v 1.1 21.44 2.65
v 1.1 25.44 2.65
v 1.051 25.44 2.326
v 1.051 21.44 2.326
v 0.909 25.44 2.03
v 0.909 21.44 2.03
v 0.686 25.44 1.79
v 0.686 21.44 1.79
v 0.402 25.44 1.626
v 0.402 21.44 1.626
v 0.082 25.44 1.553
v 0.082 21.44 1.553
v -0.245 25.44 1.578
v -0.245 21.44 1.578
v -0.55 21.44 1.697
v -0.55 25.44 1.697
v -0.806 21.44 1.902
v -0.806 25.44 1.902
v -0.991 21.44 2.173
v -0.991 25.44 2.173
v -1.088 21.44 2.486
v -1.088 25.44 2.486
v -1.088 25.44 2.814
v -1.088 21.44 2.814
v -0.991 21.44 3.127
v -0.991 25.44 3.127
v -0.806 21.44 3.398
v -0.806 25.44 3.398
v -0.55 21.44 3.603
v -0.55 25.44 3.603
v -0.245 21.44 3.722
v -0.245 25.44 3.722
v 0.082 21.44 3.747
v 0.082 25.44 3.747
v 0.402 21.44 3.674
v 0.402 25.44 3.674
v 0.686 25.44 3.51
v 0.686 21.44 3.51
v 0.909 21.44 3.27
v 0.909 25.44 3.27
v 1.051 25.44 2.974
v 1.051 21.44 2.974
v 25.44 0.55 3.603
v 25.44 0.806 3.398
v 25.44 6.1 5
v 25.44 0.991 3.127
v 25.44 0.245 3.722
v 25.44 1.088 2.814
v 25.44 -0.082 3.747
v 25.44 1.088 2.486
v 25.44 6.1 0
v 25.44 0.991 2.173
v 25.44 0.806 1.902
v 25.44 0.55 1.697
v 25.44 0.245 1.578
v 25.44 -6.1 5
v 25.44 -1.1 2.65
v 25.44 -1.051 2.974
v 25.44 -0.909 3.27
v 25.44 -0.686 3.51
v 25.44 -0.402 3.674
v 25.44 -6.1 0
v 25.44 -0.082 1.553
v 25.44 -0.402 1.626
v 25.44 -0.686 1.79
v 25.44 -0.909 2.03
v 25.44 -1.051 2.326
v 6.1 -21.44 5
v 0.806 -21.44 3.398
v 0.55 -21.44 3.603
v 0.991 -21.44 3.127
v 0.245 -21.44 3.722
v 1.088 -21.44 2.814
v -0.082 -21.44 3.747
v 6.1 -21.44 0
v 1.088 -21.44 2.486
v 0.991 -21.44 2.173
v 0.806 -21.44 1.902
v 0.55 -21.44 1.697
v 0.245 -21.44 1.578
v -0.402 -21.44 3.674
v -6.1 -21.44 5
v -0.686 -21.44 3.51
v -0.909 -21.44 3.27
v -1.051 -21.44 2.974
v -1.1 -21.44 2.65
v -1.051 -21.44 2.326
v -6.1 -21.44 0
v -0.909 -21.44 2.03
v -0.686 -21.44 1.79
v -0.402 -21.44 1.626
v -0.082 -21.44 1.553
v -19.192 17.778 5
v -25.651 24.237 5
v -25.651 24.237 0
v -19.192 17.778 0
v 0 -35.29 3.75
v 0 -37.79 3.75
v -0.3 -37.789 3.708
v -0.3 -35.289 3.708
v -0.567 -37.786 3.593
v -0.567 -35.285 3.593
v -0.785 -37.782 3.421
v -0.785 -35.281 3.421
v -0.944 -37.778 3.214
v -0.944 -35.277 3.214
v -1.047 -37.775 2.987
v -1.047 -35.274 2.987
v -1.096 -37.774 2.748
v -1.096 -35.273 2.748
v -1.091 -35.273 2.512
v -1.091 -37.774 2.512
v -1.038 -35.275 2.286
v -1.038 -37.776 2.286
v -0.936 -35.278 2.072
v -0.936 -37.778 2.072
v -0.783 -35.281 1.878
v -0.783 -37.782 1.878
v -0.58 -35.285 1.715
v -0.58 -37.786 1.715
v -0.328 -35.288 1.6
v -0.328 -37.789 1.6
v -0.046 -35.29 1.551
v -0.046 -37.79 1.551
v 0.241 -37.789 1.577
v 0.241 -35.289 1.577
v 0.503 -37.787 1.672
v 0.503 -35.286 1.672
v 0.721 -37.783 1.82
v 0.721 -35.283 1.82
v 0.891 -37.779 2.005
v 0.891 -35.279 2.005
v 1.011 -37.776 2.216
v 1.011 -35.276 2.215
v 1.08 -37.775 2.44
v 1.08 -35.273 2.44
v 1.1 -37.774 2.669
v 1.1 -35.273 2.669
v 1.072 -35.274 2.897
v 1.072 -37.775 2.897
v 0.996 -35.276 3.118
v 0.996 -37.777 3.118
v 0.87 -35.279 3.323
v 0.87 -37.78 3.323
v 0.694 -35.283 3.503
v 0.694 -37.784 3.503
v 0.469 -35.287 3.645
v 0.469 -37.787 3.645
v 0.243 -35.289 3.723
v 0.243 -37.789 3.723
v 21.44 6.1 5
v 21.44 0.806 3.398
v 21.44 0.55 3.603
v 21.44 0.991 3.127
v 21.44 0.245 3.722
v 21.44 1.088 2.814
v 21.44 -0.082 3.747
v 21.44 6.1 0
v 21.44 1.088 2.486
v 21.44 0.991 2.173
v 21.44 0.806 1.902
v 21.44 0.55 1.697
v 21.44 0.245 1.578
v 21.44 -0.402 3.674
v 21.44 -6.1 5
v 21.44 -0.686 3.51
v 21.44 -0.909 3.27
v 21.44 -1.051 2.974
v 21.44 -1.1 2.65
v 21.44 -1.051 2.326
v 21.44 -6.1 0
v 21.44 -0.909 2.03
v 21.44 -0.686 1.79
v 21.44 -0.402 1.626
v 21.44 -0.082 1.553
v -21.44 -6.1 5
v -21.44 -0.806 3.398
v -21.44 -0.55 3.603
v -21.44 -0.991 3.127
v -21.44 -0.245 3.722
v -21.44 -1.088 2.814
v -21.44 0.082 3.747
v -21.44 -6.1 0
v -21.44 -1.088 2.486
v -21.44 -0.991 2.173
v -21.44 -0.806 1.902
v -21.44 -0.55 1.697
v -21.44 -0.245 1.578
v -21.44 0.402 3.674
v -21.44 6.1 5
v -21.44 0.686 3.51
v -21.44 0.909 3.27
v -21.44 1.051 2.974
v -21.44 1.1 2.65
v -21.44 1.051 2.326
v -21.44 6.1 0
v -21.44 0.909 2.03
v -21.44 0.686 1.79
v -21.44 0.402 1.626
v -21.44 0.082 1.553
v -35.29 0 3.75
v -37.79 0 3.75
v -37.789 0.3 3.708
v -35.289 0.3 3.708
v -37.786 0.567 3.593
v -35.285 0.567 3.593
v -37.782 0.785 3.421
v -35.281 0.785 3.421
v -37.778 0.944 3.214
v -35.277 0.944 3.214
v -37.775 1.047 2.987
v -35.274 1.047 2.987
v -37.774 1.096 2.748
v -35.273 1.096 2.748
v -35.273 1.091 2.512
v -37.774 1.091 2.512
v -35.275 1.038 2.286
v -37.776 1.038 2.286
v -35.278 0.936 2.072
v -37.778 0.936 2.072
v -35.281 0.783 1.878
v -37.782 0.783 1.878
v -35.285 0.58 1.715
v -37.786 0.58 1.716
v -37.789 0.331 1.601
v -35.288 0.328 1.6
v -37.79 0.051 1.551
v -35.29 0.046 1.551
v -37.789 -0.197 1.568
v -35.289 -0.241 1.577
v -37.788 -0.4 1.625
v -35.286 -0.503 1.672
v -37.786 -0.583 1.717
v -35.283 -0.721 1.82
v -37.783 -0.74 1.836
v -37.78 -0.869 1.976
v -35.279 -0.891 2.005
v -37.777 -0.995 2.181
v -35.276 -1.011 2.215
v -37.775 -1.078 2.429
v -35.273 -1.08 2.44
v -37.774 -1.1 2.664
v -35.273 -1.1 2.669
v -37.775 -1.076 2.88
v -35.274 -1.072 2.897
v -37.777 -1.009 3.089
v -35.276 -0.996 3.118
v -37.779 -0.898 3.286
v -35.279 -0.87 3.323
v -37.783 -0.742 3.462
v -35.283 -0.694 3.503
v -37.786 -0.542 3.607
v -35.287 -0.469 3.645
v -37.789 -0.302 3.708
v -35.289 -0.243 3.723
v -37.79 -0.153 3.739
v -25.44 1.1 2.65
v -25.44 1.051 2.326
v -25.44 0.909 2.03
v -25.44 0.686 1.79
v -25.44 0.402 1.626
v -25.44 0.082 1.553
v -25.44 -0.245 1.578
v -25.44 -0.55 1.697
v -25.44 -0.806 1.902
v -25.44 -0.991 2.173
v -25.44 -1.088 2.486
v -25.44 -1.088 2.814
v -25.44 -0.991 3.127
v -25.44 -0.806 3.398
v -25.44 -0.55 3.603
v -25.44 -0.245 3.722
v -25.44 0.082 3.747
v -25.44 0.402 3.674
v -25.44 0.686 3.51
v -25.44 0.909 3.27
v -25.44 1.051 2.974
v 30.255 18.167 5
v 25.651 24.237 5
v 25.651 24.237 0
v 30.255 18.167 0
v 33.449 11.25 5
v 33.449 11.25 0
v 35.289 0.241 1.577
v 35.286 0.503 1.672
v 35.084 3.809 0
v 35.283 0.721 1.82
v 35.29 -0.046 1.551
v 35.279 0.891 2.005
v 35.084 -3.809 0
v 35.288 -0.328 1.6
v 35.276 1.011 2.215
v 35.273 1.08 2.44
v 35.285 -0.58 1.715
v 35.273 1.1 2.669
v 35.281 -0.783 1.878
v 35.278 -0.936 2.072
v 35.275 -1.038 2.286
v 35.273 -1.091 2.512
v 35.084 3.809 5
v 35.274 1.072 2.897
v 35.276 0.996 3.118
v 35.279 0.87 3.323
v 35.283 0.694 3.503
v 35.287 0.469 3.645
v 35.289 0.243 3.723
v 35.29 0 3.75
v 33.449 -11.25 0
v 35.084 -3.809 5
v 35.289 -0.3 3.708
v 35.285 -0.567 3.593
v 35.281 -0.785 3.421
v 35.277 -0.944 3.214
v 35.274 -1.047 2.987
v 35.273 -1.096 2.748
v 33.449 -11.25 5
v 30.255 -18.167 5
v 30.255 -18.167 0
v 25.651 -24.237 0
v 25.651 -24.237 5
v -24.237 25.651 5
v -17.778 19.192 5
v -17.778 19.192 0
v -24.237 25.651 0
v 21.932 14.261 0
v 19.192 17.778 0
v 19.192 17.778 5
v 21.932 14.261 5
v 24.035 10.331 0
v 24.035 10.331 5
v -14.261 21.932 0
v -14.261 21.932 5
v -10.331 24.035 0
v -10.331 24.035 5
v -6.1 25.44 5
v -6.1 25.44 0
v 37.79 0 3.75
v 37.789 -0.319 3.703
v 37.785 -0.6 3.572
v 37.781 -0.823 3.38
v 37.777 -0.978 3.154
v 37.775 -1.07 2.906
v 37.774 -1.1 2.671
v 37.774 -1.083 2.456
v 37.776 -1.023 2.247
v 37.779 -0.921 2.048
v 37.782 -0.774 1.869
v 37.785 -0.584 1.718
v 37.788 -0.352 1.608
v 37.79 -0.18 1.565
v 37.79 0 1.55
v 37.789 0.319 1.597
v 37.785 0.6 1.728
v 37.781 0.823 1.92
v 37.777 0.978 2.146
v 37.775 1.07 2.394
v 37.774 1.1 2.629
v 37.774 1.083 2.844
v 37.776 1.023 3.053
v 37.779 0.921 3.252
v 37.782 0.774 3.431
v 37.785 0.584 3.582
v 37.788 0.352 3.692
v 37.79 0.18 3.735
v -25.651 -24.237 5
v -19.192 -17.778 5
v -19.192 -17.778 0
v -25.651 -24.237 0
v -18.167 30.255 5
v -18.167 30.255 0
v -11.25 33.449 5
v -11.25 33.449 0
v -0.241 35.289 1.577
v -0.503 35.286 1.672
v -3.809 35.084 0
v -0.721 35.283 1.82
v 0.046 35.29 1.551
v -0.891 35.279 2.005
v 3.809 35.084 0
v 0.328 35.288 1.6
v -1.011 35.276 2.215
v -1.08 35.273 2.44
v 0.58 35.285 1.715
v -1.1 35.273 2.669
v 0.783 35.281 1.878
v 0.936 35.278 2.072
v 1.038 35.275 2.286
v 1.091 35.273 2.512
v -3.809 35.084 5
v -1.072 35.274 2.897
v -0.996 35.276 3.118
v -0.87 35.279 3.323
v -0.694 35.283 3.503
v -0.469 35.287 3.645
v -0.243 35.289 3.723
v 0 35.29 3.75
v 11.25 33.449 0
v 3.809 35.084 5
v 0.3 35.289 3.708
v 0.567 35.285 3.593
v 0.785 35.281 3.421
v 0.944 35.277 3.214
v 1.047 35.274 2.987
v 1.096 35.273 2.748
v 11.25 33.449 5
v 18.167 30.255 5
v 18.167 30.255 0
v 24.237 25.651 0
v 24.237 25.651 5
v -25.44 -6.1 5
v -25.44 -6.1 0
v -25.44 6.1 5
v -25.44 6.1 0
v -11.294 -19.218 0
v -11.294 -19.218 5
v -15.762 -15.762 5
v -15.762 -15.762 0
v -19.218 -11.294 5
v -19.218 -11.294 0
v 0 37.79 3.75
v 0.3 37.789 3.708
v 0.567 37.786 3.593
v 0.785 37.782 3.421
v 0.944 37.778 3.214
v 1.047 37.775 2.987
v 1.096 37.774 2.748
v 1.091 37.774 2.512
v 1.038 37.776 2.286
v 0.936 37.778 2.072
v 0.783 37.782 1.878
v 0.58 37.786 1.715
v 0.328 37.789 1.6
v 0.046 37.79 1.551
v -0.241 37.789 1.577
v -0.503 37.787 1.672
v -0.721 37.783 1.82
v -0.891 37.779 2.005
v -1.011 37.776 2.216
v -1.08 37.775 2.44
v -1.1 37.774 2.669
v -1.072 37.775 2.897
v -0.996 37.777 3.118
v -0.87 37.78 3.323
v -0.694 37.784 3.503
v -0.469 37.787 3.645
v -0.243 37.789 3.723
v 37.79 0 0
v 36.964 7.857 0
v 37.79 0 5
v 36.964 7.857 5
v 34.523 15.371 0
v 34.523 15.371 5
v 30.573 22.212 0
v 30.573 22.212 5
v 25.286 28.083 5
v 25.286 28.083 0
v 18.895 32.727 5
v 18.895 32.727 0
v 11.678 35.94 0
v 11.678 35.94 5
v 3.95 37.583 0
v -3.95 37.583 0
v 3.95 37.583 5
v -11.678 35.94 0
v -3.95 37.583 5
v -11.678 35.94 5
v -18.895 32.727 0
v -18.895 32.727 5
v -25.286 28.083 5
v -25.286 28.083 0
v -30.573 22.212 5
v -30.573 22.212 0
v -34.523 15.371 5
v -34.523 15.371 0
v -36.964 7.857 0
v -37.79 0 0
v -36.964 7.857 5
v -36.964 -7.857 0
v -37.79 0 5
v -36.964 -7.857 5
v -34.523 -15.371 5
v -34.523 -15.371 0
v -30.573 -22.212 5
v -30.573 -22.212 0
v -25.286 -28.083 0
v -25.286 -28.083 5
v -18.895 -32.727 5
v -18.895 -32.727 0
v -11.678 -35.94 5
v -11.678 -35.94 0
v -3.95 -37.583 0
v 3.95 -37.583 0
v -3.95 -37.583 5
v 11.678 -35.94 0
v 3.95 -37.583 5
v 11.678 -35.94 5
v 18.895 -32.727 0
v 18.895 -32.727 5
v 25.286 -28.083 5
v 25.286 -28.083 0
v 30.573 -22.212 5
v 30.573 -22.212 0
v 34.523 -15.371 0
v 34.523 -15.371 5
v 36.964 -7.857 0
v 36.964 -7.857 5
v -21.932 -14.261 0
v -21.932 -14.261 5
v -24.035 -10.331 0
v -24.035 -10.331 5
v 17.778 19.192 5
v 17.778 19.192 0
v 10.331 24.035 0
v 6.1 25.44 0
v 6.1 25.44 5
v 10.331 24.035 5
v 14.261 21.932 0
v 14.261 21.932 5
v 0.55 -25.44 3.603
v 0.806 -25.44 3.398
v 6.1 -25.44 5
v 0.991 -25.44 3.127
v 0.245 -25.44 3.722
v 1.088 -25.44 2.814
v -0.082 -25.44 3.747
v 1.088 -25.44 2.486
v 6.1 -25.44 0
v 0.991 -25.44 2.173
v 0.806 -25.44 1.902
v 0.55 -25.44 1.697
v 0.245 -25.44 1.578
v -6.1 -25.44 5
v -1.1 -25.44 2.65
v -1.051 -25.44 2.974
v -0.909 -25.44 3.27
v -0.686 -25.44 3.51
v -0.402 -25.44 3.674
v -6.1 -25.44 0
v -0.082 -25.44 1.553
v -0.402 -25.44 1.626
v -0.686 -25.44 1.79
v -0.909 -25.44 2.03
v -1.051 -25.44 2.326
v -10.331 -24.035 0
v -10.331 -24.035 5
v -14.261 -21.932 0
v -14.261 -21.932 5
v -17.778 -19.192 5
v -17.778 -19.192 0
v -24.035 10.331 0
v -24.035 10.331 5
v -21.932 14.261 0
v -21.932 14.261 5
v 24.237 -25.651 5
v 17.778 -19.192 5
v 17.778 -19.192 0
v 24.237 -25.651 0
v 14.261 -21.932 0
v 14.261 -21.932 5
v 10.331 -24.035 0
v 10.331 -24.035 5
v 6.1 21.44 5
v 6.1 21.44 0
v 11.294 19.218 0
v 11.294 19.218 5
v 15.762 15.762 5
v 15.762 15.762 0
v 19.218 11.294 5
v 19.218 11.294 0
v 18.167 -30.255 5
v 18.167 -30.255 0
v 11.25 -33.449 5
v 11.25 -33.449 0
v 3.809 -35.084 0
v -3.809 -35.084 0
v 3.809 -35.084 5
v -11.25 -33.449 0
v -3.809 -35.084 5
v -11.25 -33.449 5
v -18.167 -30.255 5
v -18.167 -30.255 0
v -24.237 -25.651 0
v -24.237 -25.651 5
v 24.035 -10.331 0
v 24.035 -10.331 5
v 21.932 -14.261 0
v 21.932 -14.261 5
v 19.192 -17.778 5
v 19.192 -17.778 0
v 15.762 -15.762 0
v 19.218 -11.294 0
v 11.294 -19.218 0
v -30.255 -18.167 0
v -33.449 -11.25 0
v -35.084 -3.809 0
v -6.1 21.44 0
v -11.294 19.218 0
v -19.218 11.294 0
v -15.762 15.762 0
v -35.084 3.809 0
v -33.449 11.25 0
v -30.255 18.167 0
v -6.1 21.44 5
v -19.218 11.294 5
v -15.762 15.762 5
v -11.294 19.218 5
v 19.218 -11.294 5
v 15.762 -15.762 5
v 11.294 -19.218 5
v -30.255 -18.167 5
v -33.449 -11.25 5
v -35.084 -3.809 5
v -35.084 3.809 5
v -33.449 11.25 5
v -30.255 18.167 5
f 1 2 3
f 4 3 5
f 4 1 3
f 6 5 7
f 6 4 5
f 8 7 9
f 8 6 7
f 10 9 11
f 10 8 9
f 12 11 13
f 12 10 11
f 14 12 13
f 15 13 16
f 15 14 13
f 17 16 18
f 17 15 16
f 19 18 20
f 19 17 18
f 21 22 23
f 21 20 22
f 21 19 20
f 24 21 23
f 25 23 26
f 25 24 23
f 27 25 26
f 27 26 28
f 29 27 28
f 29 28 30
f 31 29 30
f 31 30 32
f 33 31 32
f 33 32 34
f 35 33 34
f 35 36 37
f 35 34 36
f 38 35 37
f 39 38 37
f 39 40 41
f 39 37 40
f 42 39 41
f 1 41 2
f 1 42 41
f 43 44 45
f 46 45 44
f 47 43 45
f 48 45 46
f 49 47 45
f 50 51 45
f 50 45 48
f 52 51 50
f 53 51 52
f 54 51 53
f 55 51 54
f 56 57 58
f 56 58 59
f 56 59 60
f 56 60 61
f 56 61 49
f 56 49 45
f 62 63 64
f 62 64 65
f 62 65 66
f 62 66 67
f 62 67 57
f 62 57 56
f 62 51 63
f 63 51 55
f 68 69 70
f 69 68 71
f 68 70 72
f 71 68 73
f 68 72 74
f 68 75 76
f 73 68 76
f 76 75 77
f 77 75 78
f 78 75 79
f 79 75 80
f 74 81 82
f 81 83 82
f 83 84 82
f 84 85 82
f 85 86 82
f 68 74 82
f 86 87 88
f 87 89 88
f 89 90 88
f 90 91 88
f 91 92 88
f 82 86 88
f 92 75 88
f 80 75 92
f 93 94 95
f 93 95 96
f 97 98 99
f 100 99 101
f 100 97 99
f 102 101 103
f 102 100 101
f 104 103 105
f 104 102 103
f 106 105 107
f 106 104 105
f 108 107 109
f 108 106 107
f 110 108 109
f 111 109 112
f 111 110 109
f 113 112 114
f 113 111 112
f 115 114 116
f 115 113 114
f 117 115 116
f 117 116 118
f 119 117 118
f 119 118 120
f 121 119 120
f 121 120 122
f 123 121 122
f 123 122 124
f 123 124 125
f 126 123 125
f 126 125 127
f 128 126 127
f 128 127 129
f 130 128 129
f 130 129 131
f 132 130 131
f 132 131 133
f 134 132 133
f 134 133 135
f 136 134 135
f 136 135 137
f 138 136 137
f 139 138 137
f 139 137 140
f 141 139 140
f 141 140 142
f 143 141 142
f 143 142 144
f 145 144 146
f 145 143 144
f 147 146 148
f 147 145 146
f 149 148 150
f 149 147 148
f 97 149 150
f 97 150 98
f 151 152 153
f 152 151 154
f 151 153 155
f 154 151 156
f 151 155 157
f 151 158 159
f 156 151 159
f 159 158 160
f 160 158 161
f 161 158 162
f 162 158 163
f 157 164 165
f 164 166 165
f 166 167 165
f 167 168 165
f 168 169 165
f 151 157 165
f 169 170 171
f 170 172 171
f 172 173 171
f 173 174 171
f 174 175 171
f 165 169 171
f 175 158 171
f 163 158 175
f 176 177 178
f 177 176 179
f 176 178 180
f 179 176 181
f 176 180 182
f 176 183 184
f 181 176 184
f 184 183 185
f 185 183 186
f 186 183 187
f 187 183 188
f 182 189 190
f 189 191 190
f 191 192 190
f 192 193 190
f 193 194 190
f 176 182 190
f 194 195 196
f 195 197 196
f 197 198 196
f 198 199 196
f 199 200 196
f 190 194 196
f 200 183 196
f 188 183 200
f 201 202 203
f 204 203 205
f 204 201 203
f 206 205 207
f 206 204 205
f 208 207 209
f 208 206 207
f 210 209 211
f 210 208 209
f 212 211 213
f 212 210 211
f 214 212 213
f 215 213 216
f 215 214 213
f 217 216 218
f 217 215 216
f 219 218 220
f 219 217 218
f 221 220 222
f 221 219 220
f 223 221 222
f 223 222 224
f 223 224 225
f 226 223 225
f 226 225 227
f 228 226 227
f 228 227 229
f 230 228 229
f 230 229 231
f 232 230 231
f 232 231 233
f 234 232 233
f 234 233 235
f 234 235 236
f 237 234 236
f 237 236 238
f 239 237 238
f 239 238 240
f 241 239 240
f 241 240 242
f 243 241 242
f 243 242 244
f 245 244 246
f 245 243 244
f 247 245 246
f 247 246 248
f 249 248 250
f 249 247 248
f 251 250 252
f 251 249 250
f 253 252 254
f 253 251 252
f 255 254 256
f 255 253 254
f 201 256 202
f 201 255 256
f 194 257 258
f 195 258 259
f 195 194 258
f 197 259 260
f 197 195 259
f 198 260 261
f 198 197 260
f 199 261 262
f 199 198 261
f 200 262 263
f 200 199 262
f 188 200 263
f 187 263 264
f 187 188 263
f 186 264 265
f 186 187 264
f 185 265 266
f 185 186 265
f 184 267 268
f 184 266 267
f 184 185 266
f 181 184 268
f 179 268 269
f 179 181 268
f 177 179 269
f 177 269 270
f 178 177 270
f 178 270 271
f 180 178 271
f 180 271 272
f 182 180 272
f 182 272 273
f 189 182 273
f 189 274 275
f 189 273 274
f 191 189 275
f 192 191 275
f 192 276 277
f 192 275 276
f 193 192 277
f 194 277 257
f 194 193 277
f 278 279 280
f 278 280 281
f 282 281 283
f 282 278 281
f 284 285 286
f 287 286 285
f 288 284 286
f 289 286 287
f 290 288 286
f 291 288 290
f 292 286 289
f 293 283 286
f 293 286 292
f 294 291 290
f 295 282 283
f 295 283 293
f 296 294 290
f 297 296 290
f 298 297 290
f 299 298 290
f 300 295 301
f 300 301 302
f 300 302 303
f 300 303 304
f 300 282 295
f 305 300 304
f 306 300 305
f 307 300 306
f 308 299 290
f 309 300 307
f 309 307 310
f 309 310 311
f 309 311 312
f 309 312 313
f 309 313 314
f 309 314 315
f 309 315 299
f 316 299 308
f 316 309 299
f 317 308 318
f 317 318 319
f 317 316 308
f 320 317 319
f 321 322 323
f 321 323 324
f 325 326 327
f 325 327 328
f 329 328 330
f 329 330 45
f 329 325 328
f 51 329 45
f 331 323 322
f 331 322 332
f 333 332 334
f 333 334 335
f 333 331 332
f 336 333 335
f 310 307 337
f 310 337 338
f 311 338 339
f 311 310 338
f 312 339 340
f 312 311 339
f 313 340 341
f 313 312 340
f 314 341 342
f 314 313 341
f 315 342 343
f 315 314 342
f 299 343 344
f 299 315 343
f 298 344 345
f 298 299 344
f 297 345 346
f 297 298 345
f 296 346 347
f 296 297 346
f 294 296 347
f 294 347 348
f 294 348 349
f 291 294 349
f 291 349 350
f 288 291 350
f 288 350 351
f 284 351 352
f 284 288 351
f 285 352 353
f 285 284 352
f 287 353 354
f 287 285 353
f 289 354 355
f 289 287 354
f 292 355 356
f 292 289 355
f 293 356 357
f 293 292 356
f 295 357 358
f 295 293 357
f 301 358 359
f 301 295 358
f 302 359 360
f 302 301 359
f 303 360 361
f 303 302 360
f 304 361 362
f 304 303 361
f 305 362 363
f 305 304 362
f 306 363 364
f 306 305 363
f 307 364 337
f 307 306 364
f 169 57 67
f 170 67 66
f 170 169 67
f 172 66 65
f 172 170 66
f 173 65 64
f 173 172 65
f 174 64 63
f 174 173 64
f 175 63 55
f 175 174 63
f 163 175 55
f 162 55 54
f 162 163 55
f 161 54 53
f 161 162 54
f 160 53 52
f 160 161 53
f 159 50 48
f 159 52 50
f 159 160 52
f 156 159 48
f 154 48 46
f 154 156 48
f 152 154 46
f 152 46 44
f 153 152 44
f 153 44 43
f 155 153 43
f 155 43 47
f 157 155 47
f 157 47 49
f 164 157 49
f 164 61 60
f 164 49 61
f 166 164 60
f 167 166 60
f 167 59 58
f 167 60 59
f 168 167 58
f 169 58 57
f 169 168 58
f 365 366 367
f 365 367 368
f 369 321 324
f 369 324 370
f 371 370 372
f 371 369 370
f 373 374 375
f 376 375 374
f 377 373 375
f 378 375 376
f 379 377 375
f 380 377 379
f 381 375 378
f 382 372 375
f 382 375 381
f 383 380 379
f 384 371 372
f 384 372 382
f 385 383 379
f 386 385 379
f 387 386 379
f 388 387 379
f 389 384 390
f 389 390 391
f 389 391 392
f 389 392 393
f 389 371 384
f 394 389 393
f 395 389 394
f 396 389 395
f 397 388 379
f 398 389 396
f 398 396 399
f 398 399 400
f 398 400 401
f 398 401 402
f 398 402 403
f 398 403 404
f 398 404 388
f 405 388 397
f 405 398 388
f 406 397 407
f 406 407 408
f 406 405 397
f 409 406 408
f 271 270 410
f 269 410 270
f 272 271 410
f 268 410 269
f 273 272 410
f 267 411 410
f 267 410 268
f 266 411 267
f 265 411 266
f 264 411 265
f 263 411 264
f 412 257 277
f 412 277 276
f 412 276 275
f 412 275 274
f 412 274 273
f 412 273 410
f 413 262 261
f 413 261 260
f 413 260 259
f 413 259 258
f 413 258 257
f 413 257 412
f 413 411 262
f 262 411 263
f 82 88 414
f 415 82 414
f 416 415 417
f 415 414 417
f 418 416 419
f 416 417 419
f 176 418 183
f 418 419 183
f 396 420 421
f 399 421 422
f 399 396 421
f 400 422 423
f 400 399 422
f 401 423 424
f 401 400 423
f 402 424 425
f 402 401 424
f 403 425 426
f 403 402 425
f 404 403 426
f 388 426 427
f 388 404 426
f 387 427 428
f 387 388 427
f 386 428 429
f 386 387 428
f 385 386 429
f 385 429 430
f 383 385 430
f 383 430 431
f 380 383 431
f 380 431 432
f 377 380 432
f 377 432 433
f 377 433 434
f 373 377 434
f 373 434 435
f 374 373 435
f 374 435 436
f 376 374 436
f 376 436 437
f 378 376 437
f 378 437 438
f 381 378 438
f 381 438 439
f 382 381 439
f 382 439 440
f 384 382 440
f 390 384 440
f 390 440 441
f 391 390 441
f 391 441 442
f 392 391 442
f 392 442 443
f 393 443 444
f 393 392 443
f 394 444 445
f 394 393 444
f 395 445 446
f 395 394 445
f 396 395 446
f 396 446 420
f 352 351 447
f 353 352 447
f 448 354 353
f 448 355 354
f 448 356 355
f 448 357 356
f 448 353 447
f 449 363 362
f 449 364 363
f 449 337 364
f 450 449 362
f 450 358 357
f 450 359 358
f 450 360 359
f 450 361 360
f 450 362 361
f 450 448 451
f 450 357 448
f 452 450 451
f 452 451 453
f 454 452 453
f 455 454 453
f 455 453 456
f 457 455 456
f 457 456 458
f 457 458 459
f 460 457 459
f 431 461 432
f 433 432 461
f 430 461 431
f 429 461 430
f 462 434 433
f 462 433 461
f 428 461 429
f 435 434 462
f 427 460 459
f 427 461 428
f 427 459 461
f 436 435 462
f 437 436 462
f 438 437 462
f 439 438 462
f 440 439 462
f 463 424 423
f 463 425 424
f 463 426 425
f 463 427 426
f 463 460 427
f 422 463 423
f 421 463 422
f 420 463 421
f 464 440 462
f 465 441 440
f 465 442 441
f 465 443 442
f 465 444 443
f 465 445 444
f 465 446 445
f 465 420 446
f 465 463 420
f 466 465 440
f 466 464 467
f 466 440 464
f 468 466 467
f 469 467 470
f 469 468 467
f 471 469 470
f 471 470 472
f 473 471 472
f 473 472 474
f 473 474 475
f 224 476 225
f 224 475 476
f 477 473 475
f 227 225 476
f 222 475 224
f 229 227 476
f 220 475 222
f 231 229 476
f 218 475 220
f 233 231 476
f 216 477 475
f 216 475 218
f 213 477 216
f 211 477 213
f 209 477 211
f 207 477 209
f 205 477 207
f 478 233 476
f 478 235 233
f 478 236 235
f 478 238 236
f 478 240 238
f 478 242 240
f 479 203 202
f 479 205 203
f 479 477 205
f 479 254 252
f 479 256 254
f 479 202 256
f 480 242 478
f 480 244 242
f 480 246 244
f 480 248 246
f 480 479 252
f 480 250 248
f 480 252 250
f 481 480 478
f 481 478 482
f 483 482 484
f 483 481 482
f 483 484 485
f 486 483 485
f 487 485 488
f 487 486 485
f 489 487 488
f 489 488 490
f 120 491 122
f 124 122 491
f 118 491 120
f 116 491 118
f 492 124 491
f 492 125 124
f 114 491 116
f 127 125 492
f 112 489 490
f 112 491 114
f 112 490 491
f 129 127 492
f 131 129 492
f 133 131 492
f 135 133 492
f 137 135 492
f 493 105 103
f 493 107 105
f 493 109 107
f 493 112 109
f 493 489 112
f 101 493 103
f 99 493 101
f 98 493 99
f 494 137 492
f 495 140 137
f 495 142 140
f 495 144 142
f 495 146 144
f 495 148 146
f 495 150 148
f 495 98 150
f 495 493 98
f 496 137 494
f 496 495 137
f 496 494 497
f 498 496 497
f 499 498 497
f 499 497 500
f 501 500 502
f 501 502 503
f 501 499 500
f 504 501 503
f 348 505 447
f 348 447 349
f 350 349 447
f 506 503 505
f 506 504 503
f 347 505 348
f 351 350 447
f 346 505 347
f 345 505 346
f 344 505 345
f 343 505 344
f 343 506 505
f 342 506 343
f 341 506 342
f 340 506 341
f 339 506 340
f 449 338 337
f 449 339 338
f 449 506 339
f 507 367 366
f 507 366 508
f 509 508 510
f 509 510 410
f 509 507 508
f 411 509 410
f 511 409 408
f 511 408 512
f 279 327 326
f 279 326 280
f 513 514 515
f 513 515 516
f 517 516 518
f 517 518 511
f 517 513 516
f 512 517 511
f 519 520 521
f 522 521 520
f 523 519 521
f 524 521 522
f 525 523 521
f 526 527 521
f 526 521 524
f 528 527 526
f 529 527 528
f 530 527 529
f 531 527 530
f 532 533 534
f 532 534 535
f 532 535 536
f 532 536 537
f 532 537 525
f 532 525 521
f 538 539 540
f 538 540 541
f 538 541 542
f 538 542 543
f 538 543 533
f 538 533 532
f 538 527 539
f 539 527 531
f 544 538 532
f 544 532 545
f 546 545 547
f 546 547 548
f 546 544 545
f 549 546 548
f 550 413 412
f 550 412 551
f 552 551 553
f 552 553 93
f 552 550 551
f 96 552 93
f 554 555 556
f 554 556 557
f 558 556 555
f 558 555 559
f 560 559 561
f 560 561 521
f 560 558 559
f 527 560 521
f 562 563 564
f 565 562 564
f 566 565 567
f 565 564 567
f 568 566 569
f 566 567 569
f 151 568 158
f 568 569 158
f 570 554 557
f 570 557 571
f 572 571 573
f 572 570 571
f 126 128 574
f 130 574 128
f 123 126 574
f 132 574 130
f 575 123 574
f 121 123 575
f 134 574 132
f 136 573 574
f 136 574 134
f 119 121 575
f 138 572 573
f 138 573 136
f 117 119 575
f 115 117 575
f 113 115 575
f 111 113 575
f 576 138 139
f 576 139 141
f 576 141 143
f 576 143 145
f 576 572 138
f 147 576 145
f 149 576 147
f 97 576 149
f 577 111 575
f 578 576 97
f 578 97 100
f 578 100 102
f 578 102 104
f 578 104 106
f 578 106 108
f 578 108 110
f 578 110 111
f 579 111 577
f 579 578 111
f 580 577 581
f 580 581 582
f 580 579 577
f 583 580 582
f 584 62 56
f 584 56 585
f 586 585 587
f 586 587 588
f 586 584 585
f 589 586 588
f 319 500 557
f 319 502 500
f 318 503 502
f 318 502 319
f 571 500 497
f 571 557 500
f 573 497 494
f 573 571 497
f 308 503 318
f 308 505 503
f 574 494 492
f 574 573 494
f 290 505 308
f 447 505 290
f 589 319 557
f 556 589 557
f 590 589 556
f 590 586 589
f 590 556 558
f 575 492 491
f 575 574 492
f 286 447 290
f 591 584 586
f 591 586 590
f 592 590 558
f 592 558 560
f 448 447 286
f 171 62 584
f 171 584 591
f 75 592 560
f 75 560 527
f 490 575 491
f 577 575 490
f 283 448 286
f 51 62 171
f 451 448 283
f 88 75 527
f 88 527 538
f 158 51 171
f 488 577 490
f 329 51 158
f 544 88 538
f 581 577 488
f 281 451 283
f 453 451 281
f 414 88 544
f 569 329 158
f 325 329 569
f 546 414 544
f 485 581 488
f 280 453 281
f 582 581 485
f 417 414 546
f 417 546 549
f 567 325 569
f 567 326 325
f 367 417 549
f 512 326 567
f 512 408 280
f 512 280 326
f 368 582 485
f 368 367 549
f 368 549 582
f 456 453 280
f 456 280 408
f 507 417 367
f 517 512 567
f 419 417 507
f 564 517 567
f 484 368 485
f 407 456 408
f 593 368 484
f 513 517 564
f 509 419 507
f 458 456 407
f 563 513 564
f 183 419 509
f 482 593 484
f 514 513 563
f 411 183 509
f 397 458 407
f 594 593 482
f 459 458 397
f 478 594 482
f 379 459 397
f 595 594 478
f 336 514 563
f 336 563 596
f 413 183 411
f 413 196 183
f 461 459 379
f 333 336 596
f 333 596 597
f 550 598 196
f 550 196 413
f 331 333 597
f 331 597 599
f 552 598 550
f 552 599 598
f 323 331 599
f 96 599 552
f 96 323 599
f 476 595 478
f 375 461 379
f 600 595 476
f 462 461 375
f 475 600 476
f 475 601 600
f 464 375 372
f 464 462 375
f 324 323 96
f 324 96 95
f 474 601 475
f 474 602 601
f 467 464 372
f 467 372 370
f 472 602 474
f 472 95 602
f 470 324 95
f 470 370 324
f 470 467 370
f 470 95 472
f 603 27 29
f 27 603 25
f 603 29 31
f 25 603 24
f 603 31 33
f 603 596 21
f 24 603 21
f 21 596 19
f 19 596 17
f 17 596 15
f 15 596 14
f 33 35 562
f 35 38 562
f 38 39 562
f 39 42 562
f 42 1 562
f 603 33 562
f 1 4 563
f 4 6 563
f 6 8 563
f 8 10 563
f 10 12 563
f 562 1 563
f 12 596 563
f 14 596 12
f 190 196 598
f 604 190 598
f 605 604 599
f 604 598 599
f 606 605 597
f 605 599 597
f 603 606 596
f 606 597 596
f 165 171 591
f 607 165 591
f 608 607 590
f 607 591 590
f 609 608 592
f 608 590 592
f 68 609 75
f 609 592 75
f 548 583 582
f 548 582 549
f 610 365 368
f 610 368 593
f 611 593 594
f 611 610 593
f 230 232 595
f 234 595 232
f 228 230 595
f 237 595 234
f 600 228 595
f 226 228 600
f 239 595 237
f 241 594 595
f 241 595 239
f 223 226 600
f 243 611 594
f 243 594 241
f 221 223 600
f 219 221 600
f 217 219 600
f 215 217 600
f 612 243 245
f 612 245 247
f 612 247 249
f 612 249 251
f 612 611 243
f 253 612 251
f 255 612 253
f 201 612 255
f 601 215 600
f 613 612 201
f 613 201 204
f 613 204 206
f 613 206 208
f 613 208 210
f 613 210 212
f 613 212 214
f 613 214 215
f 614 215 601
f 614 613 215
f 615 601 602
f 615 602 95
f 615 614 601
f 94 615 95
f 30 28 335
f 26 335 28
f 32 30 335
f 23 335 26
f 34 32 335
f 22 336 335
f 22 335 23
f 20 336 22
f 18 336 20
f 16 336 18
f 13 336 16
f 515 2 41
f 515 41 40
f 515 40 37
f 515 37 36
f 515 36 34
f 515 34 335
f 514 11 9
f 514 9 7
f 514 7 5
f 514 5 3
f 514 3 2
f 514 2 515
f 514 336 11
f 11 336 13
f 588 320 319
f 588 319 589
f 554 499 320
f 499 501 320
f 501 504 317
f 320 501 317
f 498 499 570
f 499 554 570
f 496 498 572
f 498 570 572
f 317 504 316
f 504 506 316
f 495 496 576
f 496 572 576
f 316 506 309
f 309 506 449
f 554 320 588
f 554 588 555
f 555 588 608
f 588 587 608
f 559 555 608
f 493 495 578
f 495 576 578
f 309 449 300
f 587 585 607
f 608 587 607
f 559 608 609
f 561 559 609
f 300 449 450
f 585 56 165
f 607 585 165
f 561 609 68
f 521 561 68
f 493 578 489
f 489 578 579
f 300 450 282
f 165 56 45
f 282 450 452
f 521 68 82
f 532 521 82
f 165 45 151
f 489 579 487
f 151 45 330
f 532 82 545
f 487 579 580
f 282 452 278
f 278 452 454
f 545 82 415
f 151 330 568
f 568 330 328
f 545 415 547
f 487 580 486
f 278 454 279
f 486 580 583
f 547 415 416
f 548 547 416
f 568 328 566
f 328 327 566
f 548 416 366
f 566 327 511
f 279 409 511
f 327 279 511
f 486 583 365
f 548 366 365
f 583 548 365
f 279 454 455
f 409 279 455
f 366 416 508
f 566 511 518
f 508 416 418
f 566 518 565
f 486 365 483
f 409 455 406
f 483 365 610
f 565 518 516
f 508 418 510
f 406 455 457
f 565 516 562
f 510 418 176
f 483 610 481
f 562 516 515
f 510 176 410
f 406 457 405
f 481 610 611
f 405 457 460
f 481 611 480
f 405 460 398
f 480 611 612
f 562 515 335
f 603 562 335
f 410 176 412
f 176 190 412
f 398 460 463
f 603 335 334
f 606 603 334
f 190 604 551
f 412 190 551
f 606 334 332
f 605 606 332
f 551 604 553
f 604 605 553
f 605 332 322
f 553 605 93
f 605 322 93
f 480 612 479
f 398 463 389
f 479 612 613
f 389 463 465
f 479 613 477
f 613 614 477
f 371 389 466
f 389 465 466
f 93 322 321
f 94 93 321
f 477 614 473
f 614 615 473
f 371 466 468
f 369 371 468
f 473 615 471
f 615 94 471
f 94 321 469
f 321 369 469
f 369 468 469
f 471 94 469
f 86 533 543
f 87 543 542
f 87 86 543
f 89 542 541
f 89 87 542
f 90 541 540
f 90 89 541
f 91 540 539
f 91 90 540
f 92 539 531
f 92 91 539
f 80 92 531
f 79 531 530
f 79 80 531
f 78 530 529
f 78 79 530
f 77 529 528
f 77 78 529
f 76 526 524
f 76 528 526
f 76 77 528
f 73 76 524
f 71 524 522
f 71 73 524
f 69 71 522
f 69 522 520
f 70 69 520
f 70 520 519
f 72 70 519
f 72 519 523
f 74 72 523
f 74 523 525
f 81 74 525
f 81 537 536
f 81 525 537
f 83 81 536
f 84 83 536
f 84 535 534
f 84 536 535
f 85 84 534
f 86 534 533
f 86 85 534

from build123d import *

# Parameters (mm, degrees)
BOSS_EXTRUDE1_DEPTH = 5
CUT_EXTRUDE2_START  = -4
SKETCH3_R           = 1.1
CUT_EXTRUDE2_DEPTH  = 5
CIRPATTERN7_COUNT   = 4
SKETCH4_R           = 37.79
BOSS_EXTRUDE2_DEPTH = 5
SKETCH5_R           = 1.1
CUT_EXTRUDE3_DEPTH  = 13.35
CIRPATTERN8_COUNT   = 4


with BuildPart() as part:
    # Sketch1 → Boss-Extrude1 (new body)
    with BuildSketch(Plane.XY):
        with BuildLine():
            Line((-6.1, 25.44), (6.1, 25.44))
            ThreePointArc((6.1, 25.44), (18.498697251, 18.498697251), (25.44, 6.1))
            Line((25.44, 6.1), (25.44, -6.1))
            ThreePointArc((25.44, -6.1), (18.498697251, -18.498697251), (6.1, -25.44))
            Line((6.1, -25.44), (-6.1, -25.44))
            ThreePointArc((-6.1, -25.44), (-18.498697251, -18.498697251), (-25.44, -6.1))
            Line((-25.44, -6.1), (-25.44, 6.1))
            ThreePointArc((-25.44, 6.1), (-18.498697251, 18.498697251), (-6.1, 25.44))
        make_face()
        with BuildLine():
            Line((-6.1, 21.44), (6.1, 21.44))
            ThreePointArc((6.1, 21.44), (15.76203667, 15.76203667), (21.44, 6.1))
            Line((21.44, 6.1), (21.44, -6.1))
            ThreePointArc((21.44, -6.1), (15.76203667, -15.76203667), (6.1, -21.44))
            Line((6.1, -21.44), (-6.1, -21.44))
            ThreePointArc((-6.1, -21.44), (-15.76203667, -15.76203667), (-21.44, -6.1))
            Line((-21.44, -6.1), (-21.44, 6.1))
            ThreePointArc((-21.44, 6.1), (-15.76203667, 15.76203667), (-6.1, 21.44))
        make_face(mode=Mode.SUBTRACT)
    extrude(amount=BOSS_EXTRUDE1_DEPTH)

    # Sketch3 → Cut-Extrude2 (cut)
    with BuildSketch(Plane(origin=(0, 25.44, 0), x_dir=(1, 0, 0), z_dir=(0, 1, 0)).offset(CUT_EXTRUDE2_START)):
        with Locations((0, -2.65)):
            Circle(SKETCH3_R)
    cut_extrude2 = extrude(amount=CUT_EXTRUDE2_DEPTH, mode=Mode.SUBTRACT)

    # CirPattern7: Cut-Extrude2 ×4 about axis
    cirpattern7_axis = Axis((0, 0, 5), (0, 0, -1))
    for i in range(1, CIRPATTERN7_COUNT):
        add(cut_extrude2.rotate(cirpattern7_axis, i * 360 / CIRPATTERN7_COUNT), mode=Mode.SUBTRACT)

    # Sketch4 → Boss-Extrude2 (add)
    with BuildSketch(Plane.XY.offset(5)):
        Circle(SKETCH4_R)
        with BuildLine():
            Line((-25.650884562, 24.236671), (-19.192284627, 17.778071065))
            ThreePointArc((-19.192284627, 17.778071065), (-18.498697251, 18.498697251), (-17.778071065, 19.192284627))
            Line((-17.778071065, 19.192284627), (-24.236671, 25.650884562))
            ThreePointArc((-24.236671, 25.650884562), (0, 35.29), (24.236671, 25.650884562))
            Line((24.236671, 25.650884562), (17.778071065, 19.192284627))
            ThreePointArc((17.778071065, 19.192284627), (18.498697251, 18.498697251), (19.192284627, 17.778071065))
            Line((19.192284627, 17.778071065), (25.650884562, 24.236671))
            ThreePointArc((25.650884562, 24.236671), (35.29, 0), (25.650884562, -24.236671))
            Line((25.650884562, -24.236671), (19.192284627, -17.778071065))
            ThreePointArc((19.192284627, -17.778071065), (18.498697251, -18.498697251), (17.778071065, -19.192284627))
            Line((17.778071065, -19.192284627), (24.236671, -25.650884562))
            ThreePointArc((24.236671, -25.650884562), (0, -35.29), (-24.236671, -25.650884562))
            Line((-24.236671, -25.650884562), (-17.778071065, -19.192284627))
            ThreePointArc((-17.778071065, -19.192284627), (-18.498697251, -18.498697251), (-19.192284627, -17.778071065))
            Line((-19.192284627, -17.778071065), (-25.650884562, -24.236671))
            ThreePointArc((-25.650884562, -24.236671), (-35.29, 0), (-25.650884562, 24.236671))
        make_face(mode=Mode.SUBTRACT)
    extrude(amount=-BOSS_EXTRUDE2_DEPTH)

    # Sketch5 → Cut-Extrude3 (cut, through all)
    with BuildSketch(Plane.ZY.offset(25.44)):
        with Locations((2.65, 0)):
            Circle(SKETCH5_R)
    cut_extrude3 = extrude(amount=CUT_EXTRUDE3_DEPTH, mode=Mode.SUBTRACT)

    # CirPattern8: Cut-Extrude3 ×4 about axis
    cirpattern8_axis = Axis((0, 0, -106.886261044), (0, 0, 1))
    for i in range(1, CIRPATTERN8_COUNT):
        add(cut_extrude3.rotate(cirpattern8_axis, i * 360 / CIRPATTERN8_COUNT), mode=Mode.SUBTRACT)


solid = part.part
